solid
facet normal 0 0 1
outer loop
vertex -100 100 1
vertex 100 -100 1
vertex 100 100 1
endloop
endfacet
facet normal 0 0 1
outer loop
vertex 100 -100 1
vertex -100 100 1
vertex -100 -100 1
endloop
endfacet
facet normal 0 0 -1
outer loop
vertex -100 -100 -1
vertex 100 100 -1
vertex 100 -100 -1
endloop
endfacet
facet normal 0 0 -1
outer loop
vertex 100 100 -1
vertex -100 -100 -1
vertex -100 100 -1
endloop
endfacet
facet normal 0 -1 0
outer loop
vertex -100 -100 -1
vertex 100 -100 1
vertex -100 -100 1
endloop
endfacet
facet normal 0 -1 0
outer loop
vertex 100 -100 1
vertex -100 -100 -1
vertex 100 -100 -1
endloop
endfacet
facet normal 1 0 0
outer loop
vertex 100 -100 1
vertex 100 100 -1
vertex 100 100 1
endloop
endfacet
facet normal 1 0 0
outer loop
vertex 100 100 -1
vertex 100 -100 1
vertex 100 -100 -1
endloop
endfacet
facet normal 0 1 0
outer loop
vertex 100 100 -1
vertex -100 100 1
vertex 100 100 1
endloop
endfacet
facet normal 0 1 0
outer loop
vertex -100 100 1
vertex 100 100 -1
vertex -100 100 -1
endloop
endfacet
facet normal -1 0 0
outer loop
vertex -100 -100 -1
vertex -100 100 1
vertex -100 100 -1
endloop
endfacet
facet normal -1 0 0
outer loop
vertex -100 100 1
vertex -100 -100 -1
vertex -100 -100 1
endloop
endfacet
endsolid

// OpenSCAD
$fn = 64;

length = 200;
width  = 200;
thickness = 2;

cube([length, width, thickness], center = true);
